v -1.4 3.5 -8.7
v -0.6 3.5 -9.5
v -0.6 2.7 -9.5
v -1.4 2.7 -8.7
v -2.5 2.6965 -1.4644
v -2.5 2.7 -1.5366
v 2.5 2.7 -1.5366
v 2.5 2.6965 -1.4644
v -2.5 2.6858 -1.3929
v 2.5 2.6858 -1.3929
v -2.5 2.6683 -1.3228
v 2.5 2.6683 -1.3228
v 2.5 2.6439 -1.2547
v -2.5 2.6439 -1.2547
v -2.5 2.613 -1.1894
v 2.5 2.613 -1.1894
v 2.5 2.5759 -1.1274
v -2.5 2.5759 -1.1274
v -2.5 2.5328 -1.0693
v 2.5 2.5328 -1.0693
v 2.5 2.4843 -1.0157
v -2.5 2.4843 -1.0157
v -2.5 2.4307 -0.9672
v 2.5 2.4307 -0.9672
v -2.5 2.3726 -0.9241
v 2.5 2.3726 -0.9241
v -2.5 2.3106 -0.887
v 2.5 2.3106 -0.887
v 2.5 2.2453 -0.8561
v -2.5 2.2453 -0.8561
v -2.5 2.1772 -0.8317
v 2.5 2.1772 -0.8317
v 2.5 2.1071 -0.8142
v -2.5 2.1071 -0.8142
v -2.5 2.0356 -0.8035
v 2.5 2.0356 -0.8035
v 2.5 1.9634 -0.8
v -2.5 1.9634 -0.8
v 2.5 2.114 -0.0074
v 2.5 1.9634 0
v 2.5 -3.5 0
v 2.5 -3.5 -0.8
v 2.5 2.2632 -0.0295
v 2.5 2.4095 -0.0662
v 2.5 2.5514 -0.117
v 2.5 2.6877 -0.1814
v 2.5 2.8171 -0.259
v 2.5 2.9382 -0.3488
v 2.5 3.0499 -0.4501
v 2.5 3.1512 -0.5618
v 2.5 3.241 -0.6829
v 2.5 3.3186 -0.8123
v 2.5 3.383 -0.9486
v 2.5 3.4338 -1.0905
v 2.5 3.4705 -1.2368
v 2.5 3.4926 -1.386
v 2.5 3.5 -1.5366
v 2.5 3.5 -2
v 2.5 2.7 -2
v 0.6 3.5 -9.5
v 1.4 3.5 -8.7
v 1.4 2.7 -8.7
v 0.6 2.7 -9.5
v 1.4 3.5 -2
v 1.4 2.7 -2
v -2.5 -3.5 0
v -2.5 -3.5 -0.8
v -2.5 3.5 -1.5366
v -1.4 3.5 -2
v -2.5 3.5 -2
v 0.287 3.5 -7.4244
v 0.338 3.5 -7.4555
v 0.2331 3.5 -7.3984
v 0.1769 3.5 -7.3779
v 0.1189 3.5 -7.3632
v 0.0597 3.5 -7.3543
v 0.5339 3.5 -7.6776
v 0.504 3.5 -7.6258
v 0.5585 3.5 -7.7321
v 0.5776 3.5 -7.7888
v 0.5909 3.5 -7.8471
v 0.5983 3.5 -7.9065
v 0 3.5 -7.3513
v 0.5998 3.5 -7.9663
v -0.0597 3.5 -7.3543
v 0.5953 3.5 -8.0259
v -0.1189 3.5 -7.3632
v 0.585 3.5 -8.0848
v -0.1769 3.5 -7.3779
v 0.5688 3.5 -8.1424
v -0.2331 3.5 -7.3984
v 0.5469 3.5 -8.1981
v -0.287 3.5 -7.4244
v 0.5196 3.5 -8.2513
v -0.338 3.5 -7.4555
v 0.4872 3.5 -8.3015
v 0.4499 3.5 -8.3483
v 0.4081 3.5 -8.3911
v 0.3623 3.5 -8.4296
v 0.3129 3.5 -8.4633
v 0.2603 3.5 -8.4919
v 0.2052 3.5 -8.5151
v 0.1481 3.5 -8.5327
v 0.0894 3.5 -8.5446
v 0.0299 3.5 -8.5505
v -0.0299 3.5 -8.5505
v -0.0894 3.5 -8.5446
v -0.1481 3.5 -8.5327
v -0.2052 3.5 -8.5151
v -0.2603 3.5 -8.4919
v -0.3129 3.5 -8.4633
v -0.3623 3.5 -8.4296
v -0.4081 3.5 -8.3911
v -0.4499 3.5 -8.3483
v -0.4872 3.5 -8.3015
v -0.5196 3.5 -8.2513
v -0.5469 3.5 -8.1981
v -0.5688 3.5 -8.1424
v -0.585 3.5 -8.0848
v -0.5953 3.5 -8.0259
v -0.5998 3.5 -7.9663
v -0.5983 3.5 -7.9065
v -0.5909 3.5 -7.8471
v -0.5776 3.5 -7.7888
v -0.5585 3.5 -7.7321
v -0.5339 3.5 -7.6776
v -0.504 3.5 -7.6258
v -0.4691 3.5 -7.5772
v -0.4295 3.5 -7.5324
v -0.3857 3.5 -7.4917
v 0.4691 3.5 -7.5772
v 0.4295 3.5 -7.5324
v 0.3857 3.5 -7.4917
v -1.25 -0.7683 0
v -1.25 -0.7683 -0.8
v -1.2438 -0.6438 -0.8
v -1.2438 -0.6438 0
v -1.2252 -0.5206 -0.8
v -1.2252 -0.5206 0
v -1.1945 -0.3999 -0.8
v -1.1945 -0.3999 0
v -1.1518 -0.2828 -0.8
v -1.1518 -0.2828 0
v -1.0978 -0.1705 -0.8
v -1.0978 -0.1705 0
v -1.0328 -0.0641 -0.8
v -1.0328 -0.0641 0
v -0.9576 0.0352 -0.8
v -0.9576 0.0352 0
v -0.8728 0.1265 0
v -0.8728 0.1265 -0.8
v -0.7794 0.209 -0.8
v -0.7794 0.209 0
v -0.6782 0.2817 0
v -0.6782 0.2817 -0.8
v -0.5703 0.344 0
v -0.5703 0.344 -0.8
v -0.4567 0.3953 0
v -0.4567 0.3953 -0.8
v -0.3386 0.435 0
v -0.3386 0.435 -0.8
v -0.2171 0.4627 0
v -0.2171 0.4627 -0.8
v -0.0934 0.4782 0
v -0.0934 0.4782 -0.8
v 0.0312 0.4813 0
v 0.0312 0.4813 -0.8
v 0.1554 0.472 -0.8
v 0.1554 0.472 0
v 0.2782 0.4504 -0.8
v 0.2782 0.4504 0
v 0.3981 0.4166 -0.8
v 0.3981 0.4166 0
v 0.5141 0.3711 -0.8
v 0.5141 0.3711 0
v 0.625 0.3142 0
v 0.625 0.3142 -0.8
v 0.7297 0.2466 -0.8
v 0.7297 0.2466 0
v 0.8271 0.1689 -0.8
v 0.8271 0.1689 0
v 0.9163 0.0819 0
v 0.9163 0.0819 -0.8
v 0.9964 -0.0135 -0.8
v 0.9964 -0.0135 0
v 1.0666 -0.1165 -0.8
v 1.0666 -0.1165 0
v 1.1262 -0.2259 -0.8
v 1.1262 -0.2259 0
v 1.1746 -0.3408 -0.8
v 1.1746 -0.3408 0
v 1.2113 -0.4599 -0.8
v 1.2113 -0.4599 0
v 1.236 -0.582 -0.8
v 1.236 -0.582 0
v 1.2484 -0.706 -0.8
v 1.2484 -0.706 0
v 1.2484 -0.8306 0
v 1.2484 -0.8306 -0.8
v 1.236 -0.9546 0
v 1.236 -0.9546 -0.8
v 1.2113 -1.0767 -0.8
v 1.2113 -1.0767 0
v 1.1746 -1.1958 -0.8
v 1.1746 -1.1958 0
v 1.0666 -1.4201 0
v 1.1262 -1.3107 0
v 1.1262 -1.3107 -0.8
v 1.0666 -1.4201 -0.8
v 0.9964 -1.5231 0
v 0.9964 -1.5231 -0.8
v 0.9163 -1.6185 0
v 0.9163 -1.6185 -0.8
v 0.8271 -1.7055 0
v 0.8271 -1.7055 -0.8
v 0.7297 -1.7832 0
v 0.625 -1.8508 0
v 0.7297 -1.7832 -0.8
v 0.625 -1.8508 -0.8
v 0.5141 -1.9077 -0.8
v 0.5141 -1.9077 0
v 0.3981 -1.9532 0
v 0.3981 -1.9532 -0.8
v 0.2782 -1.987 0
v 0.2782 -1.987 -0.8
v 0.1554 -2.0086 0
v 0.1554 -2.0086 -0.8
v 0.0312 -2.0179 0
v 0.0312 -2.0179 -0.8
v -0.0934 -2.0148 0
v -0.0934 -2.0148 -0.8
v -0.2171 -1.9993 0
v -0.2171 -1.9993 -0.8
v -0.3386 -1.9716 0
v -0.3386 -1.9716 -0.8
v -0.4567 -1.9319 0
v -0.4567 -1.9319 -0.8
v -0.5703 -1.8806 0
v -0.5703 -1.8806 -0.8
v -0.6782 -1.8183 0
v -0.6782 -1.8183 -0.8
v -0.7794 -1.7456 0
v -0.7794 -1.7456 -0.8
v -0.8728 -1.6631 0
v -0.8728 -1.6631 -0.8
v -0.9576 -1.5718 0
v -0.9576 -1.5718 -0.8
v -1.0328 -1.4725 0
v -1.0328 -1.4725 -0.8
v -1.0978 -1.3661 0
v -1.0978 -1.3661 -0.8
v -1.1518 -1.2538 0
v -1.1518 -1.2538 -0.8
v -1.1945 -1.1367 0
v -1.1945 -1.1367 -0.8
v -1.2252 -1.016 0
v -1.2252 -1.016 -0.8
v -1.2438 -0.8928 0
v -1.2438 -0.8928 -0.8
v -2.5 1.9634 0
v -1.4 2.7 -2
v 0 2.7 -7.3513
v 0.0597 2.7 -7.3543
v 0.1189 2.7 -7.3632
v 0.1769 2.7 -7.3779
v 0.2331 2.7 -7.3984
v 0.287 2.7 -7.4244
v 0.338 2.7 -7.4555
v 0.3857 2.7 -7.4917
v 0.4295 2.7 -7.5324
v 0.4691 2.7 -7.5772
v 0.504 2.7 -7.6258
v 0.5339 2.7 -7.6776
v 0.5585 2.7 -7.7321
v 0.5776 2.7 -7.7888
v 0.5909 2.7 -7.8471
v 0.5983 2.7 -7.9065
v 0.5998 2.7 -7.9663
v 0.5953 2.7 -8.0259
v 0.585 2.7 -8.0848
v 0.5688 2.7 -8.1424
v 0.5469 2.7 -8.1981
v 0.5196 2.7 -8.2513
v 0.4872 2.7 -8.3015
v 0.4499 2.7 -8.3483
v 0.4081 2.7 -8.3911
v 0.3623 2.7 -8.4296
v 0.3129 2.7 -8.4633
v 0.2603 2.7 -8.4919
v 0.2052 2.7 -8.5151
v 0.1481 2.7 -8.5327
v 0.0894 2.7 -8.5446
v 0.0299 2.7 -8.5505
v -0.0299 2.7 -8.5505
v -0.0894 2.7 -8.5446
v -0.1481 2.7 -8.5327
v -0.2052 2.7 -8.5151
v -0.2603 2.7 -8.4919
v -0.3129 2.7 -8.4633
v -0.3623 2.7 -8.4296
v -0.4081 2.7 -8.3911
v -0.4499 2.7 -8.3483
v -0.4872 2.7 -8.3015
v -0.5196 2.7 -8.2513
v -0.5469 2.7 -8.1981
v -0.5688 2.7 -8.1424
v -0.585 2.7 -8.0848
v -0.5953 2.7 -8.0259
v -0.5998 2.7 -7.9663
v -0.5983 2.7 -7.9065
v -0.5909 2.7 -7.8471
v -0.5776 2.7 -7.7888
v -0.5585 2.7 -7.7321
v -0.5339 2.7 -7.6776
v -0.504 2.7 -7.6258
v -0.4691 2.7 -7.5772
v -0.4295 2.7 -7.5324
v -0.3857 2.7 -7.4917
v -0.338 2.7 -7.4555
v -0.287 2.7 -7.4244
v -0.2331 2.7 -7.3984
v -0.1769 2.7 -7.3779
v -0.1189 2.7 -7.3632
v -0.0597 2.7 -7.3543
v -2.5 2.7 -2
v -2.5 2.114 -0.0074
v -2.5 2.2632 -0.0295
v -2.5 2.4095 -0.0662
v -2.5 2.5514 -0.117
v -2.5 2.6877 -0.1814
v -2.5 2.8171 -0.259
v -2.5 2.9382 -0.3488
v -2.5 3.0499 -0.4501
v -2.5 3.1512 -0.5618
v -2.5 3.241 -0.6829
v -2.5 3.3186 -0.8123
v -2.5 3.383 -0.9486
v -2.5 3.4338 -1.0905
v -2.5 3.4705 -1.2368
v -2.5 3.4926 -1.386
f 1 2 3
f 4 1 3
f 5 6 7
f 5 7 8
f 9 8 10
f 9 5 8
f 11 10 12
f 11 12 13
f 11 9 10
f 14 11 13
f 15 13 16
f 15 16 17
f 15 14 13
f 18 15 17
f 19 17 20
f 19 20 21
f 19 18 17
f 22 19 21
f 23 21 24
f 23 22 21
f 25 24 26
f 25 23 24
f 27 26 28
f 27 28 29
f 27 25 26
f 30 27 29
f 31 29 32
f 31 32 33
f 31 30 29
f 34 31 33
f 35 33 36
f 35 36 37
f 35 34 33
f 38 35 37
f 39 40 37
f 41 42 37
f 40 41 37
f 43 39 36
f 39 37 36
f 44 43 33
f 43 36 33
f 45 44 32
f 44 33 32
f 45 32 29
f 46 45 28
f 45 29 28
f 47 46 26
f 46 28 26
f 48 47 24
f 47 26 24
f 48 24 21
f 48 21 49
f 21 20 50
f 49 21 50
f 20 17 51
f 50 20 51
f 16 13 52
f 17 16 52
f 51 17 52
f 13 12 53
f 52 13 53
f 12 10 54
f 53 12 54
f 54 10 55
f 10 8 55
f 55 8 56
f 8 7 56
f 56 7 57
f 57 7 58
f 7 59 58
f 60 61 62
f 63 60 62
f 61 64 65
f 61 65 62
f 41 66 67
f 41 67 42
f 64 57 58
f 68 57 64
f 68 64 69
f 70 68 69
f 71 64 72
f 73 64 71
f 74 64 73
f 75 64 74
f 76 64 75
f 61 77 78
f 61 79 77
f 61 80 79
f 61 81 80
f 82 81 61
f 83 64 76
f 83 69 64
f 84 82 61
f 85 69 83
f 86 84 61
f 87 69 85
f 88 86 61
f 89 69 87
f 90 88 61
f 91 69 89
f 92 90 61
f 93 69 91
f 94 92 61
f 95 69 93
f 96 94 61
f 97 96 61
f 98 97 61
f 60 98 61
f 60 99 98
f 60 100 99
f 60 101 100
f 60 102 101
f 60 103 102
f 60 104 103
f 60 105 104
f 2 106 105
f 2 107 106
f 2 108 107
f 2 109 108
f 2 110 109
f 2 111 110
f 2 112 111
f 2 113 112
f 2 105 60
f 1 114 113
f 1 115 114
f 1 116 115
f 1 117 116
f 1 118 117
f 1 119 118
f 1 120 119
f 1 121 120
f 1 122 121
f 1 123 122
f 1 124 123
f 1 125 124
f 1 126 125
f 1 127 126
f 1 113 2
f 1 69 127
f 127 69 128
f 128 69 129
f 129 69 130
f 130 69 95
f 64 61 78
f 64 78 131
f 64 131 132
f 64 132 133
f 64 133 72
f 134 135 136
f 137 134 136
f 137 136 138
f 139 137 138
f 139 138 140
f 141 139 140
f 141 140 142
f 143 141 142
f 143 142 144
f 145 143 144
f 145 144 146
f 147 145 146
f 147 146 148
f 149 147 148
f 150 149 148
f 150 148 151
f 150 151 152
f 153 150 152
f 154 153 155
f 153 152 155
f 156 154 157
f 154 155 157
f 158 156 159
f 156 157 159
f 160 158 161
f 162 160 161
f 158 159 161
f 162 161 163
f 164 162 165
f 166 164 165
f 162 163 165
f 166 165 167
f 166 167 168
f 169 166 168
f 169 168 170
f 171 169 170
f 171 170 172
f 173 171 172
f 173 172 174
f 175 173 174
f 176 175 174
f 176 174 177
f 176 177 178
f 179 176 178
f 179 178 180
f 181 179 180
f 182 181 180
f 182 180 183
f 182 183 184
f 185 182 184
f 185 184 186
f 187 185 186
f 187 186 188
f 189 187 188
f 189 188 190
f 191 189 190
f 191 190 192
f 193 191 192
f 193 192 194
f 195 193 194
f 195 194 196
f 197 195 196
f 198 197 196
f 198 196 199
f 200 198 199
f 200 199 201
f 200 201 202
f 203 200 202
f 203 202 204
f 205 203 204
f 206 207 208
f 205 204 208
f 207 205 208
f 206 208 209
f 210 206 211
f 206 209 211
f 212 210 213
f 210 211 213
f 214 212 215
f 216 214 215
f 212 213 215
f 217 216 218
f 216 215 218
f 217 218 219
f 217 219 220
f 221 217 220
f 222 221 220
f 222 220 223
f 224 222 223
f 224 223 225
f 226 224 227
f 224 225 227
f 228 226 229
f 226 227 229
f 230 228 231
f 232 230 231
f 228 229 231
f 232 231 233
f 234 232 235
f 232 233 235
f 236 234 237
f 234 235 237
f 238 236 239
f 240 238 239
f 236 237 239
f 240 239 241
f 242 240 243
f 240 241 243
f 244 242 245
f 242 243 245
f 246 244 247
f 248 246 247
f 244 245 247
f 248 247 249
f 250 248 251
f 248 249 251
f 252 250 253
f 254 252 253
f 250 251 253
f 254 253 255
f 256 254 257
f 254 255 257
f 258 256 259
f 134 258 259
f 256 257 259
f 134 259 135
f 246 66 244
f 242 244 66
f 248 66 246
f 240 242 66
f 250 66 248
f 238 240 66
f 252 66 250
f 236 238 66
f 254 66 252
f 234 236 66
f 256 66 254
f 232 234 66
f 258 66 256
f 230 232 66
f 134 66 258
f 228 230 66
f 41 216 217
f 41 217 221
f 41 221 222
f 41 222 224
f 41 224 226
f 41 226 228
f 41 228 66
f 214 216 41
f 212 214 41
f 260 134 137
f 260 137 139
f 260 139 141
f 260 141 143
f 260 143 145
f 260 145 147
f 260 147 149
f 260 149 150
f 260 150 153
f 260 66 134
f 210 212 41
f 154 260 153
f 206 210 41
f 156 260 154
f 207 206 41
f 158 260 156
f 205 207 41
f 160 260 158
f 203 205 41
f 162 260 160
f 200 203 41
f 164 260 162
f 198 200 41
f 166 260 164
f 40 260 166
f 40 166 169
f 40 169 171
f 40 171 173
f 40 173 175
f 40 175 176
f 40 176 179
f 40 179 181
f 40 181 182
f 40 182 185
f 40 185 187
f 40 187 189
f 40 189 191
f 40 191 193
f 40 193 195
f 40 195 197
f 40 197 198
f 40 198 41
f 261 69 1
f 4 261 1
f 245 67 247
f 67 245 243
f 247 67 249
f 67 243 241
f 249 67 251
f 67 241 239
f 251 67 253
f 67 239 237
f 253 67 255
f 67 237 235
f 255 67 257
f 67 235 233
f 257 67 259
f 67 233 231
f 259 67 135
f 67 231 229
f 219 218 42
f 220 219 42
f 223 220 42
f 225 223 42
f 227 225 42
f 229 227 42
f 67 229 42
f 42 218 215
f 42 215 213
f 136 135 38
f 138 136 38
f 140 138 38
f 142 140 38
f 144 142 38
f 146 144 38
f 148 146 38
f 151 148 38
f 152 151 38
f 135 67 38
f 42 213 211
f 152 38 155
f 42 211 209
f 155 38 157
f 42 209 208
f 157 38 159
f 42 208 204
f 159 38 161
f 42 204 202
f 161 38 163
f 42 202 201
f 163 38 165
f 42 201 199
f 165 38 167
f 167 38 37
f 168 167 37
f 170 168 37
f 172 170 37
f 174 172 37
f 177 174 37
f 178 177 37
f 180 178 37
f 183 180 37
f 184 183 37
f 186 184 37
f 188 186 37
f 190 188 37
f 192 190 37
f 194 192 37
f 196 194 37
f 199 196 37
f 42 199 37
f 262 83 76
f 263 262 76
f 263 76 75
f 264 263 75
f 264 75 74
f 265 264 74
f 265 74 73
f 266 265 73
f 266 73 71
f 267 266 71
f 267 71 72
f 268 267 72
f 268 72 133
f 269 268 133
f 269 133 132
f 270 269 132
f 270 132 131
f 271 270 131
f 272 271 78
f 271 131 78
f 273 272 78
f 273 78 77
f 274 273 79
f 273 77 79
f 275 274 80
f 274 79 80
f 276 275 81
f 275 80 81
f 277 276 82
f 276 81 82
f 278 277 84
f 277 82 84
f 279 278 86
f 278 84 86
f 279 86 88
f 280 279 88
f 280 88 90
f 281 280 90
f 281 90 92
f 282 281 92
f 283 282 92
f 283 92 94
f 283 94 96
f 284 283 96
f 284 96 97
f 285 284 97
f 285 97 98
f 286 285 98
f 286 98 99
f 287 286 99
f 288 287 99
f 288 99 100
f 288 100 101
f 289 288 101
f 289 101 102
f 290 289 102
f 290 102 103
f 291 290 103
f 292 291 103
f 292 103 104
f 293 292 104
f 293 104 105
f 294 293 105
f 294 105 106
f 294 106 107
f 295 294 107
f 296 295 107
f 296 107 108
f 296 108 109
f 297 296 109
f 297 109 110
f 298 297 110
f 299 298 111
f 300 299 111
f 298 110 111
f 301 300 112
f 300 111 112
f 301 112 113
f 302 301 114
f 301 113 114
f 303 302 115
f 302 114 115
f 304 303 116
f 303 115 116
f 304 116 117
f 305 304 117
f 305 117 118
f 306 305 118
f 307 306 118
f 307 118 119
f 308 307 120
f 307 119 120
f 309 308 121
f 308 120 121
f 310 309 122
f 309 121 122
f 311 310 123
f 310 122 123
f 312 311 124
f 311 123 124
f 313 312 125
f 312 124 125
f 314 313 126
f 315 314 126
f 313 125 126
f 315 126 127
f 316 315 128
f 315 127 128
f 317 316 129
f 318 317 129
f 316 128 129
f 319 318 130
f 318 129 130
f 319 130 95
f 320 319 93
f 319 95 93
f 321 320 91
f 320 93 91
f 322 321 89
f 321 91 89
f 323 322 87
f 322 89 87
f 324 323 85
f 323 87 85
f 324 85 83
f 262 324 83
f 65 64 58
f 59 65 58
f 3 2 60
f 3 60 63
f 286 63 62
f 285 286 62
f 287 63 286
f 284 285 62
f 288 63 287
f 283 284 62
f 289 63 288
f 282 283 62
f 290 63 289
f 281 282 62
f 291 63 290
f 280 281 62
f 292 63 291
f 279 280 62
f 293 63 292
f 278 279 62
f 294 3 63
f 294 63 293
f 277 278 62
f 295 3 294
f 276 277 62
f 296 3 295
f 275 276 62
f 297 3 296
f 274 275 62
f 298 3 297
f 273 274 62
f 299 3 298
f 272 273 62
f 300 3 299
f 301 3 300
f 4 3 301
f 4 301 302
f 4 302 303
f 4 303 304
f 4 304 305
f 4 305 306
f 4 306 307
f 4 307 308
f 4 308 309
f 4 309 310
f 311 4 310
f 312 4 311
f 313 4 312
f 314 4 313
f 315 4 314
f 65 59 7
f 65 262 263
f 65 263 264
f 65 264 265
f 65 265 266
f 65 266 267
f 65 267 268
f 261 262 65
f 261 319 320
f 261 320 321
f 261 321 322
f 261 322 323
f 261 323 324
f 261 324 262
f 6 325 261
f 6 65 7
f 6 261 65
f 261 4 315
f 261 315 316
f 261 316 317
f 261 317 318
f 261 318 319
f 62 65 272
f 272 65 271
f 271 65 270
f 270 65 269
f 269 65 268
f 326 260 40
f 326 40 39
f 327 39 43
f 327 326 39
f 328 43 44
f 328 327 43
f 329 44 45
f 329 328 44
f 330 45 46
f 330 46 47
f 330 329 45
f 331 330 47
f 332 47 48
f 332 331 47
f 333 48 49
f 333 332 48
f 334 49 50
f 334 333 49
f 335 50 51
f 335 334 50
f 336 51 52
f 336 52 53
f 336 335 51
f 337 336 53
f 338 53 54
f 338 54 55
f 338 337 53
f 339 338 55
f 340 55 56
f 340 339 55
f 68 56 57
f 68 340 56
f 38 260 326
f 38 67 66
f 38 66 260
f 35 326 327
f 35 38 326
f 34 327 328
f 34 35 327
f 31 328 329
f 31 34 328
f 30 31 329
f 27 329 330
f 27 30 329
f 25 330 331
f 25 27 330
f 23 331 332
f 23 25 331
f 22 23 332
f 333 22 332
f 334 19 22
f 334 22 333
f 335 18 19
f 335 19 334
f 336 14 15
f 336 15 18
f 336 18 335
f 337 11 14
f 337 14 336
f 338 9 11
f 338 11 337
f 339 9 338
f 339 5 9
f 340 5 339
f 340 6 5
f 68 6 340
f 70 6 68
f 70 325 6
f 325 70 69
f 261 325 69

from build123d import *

# Parameters (mm, degrees)
SKETCH_1_W                       = 5
SKETCH_1_H                       = 7
SM_BASE_FLANGE_1_DEPTH           = 0.8
SM_EDGE_FLANGE_1_STRIP_W         = 4.6732
SM_EDGE_FLANGE_1_STRIP_H         = 0.8
SM_EDGE_FLANGE_1_STRIP_CUT_DEPTH = 5
SM_EDGE_FLANGE_1_DEPTH           = 5
SKETCH_7_R                       = 1.25
CUT_EXTRUDE_1_DEPTH              = 10
SKETCH_8_W                       = 1.1
SKETCH_8_H                       = 7.5
CUT_EXTRUDE_2_DEPTH              = 10
SKETCH_9_R                       = 0.6
CUT_EXTRUDE_3_DEPTH              = 10
CHAMFER_1_SIZE                   = 0.8


# Sheet-metal steps are written as plain solids
with BuildPart() as part:
    # Sketch 1 → 基体-法兰1 (new body)
    with BuildSketch(Plane.XY):
        Rectangle(SKETCH_1_W, SKETCH_1_H)
    extrude(amount=-SM_BASE_FLANGE_1_DEPTH)

    # 边线-法兰1 strip (across the edge) → 边线-法兰1 strip cut (cut)
    with BuildSketch(Plane(origin=(-2.5, 3.5, -0.8), x_dir=(0, -1, 0), z_dir=(1, 0, 0))):
        with Locations((-0.8, -0.4)):
            Rectangle(SM_EDGE_FLANGE_1_STRIP_W, SM_EDGE_FLANGE_1_STRIP_H)
    extrude(amount=SM_EDGE_FLANGE_1_STRIP_CUT_DEPTH, mode=Mode.SUBTRACT)

    # 边线-法兰1 section (across the edge) → 边线-法兰1 (add)
    with BuildSketch(Plane(origin=(-2.5, 3.5, -0.8), x_dir=(0, -1, 0), z_dir=(1, 0, 0))):
        with BuildLine():
            Line((0, 0.7366), (0, 8.7))
            Line((0, 8.7), (0.8, 8.7))
            Line((0.8, 8.7), (0.8, 0.7366))
            ThreePointArc((0.8, 0.7366), (1.015745145, 0.215745145), (1.5366, 0))
            Line((1.5366, 0), (1.5366, -0.8))
            ThreePointArc((1.5366, -0.8), (0.45005972, -0.34994028), (0, 0.7366))
        make_face()
    extrude(amount=SM_EDGE_FLANGE_1_DEPTH)

    # 草图7 → 切除-拉伸1 (cut)
    with BuildSketch(Plane(origin=(0, 0, -0.8), x_dir=(-1, 0, 0), z_dir=(0, 0, -1))):
        with Locations((0, -0.7683)):
            Circle(SKETCH_7_R)
    extrude(amount=-CUT_EXTRUDE_1_DEPTH, mode=Mode.SUBTRACT)

    # 草图8 → 切除-拉伸2 (cut)
    with BuildSketch(Plane(origin=(0, 3.5, 0), x_dir=(1, 0, 0), z_dir=(0, 1, 0))):
        with Locations((1.95, 5.75)):
            Rectangle(SKETCH_8_W, SKETCH_8_H)
        with Locations((-1.95, 5.75)):
            Rectangle(SKETCH_8_W, SKETCH_8_H)
    extrude(amount=-CUT_EXTRUDE_2_DEPTH, mode=Mode.SUBTRACT)

    # 草图9 → 切除-拉伸3 (cut)
    with BuildSketch(Plane(origin=(0, 3.5, 0), x_dir=(1, 0, 0), z_dir=(0, 1, 0))):
        with Locations(Location((0, 7.951292253, 0), (0, 0, 270))):
            Circle(SKETCH_9_R)
    extrude(amount=-CUT_EXTRUDE_3_DEPTH, mode=Mode.SUBTRACT)

    # 倒角1
    chamfer_1_edges = [part.edges().sort_by_distance(p)[0] for p in [
        (-1.4, 3.1, -9.5),
        (1.4, 3.1, -9.5),
    ]]
    chamfer(chamfer_1_edges, length=CHAMFER_1_SIZE)


solid = part.part
